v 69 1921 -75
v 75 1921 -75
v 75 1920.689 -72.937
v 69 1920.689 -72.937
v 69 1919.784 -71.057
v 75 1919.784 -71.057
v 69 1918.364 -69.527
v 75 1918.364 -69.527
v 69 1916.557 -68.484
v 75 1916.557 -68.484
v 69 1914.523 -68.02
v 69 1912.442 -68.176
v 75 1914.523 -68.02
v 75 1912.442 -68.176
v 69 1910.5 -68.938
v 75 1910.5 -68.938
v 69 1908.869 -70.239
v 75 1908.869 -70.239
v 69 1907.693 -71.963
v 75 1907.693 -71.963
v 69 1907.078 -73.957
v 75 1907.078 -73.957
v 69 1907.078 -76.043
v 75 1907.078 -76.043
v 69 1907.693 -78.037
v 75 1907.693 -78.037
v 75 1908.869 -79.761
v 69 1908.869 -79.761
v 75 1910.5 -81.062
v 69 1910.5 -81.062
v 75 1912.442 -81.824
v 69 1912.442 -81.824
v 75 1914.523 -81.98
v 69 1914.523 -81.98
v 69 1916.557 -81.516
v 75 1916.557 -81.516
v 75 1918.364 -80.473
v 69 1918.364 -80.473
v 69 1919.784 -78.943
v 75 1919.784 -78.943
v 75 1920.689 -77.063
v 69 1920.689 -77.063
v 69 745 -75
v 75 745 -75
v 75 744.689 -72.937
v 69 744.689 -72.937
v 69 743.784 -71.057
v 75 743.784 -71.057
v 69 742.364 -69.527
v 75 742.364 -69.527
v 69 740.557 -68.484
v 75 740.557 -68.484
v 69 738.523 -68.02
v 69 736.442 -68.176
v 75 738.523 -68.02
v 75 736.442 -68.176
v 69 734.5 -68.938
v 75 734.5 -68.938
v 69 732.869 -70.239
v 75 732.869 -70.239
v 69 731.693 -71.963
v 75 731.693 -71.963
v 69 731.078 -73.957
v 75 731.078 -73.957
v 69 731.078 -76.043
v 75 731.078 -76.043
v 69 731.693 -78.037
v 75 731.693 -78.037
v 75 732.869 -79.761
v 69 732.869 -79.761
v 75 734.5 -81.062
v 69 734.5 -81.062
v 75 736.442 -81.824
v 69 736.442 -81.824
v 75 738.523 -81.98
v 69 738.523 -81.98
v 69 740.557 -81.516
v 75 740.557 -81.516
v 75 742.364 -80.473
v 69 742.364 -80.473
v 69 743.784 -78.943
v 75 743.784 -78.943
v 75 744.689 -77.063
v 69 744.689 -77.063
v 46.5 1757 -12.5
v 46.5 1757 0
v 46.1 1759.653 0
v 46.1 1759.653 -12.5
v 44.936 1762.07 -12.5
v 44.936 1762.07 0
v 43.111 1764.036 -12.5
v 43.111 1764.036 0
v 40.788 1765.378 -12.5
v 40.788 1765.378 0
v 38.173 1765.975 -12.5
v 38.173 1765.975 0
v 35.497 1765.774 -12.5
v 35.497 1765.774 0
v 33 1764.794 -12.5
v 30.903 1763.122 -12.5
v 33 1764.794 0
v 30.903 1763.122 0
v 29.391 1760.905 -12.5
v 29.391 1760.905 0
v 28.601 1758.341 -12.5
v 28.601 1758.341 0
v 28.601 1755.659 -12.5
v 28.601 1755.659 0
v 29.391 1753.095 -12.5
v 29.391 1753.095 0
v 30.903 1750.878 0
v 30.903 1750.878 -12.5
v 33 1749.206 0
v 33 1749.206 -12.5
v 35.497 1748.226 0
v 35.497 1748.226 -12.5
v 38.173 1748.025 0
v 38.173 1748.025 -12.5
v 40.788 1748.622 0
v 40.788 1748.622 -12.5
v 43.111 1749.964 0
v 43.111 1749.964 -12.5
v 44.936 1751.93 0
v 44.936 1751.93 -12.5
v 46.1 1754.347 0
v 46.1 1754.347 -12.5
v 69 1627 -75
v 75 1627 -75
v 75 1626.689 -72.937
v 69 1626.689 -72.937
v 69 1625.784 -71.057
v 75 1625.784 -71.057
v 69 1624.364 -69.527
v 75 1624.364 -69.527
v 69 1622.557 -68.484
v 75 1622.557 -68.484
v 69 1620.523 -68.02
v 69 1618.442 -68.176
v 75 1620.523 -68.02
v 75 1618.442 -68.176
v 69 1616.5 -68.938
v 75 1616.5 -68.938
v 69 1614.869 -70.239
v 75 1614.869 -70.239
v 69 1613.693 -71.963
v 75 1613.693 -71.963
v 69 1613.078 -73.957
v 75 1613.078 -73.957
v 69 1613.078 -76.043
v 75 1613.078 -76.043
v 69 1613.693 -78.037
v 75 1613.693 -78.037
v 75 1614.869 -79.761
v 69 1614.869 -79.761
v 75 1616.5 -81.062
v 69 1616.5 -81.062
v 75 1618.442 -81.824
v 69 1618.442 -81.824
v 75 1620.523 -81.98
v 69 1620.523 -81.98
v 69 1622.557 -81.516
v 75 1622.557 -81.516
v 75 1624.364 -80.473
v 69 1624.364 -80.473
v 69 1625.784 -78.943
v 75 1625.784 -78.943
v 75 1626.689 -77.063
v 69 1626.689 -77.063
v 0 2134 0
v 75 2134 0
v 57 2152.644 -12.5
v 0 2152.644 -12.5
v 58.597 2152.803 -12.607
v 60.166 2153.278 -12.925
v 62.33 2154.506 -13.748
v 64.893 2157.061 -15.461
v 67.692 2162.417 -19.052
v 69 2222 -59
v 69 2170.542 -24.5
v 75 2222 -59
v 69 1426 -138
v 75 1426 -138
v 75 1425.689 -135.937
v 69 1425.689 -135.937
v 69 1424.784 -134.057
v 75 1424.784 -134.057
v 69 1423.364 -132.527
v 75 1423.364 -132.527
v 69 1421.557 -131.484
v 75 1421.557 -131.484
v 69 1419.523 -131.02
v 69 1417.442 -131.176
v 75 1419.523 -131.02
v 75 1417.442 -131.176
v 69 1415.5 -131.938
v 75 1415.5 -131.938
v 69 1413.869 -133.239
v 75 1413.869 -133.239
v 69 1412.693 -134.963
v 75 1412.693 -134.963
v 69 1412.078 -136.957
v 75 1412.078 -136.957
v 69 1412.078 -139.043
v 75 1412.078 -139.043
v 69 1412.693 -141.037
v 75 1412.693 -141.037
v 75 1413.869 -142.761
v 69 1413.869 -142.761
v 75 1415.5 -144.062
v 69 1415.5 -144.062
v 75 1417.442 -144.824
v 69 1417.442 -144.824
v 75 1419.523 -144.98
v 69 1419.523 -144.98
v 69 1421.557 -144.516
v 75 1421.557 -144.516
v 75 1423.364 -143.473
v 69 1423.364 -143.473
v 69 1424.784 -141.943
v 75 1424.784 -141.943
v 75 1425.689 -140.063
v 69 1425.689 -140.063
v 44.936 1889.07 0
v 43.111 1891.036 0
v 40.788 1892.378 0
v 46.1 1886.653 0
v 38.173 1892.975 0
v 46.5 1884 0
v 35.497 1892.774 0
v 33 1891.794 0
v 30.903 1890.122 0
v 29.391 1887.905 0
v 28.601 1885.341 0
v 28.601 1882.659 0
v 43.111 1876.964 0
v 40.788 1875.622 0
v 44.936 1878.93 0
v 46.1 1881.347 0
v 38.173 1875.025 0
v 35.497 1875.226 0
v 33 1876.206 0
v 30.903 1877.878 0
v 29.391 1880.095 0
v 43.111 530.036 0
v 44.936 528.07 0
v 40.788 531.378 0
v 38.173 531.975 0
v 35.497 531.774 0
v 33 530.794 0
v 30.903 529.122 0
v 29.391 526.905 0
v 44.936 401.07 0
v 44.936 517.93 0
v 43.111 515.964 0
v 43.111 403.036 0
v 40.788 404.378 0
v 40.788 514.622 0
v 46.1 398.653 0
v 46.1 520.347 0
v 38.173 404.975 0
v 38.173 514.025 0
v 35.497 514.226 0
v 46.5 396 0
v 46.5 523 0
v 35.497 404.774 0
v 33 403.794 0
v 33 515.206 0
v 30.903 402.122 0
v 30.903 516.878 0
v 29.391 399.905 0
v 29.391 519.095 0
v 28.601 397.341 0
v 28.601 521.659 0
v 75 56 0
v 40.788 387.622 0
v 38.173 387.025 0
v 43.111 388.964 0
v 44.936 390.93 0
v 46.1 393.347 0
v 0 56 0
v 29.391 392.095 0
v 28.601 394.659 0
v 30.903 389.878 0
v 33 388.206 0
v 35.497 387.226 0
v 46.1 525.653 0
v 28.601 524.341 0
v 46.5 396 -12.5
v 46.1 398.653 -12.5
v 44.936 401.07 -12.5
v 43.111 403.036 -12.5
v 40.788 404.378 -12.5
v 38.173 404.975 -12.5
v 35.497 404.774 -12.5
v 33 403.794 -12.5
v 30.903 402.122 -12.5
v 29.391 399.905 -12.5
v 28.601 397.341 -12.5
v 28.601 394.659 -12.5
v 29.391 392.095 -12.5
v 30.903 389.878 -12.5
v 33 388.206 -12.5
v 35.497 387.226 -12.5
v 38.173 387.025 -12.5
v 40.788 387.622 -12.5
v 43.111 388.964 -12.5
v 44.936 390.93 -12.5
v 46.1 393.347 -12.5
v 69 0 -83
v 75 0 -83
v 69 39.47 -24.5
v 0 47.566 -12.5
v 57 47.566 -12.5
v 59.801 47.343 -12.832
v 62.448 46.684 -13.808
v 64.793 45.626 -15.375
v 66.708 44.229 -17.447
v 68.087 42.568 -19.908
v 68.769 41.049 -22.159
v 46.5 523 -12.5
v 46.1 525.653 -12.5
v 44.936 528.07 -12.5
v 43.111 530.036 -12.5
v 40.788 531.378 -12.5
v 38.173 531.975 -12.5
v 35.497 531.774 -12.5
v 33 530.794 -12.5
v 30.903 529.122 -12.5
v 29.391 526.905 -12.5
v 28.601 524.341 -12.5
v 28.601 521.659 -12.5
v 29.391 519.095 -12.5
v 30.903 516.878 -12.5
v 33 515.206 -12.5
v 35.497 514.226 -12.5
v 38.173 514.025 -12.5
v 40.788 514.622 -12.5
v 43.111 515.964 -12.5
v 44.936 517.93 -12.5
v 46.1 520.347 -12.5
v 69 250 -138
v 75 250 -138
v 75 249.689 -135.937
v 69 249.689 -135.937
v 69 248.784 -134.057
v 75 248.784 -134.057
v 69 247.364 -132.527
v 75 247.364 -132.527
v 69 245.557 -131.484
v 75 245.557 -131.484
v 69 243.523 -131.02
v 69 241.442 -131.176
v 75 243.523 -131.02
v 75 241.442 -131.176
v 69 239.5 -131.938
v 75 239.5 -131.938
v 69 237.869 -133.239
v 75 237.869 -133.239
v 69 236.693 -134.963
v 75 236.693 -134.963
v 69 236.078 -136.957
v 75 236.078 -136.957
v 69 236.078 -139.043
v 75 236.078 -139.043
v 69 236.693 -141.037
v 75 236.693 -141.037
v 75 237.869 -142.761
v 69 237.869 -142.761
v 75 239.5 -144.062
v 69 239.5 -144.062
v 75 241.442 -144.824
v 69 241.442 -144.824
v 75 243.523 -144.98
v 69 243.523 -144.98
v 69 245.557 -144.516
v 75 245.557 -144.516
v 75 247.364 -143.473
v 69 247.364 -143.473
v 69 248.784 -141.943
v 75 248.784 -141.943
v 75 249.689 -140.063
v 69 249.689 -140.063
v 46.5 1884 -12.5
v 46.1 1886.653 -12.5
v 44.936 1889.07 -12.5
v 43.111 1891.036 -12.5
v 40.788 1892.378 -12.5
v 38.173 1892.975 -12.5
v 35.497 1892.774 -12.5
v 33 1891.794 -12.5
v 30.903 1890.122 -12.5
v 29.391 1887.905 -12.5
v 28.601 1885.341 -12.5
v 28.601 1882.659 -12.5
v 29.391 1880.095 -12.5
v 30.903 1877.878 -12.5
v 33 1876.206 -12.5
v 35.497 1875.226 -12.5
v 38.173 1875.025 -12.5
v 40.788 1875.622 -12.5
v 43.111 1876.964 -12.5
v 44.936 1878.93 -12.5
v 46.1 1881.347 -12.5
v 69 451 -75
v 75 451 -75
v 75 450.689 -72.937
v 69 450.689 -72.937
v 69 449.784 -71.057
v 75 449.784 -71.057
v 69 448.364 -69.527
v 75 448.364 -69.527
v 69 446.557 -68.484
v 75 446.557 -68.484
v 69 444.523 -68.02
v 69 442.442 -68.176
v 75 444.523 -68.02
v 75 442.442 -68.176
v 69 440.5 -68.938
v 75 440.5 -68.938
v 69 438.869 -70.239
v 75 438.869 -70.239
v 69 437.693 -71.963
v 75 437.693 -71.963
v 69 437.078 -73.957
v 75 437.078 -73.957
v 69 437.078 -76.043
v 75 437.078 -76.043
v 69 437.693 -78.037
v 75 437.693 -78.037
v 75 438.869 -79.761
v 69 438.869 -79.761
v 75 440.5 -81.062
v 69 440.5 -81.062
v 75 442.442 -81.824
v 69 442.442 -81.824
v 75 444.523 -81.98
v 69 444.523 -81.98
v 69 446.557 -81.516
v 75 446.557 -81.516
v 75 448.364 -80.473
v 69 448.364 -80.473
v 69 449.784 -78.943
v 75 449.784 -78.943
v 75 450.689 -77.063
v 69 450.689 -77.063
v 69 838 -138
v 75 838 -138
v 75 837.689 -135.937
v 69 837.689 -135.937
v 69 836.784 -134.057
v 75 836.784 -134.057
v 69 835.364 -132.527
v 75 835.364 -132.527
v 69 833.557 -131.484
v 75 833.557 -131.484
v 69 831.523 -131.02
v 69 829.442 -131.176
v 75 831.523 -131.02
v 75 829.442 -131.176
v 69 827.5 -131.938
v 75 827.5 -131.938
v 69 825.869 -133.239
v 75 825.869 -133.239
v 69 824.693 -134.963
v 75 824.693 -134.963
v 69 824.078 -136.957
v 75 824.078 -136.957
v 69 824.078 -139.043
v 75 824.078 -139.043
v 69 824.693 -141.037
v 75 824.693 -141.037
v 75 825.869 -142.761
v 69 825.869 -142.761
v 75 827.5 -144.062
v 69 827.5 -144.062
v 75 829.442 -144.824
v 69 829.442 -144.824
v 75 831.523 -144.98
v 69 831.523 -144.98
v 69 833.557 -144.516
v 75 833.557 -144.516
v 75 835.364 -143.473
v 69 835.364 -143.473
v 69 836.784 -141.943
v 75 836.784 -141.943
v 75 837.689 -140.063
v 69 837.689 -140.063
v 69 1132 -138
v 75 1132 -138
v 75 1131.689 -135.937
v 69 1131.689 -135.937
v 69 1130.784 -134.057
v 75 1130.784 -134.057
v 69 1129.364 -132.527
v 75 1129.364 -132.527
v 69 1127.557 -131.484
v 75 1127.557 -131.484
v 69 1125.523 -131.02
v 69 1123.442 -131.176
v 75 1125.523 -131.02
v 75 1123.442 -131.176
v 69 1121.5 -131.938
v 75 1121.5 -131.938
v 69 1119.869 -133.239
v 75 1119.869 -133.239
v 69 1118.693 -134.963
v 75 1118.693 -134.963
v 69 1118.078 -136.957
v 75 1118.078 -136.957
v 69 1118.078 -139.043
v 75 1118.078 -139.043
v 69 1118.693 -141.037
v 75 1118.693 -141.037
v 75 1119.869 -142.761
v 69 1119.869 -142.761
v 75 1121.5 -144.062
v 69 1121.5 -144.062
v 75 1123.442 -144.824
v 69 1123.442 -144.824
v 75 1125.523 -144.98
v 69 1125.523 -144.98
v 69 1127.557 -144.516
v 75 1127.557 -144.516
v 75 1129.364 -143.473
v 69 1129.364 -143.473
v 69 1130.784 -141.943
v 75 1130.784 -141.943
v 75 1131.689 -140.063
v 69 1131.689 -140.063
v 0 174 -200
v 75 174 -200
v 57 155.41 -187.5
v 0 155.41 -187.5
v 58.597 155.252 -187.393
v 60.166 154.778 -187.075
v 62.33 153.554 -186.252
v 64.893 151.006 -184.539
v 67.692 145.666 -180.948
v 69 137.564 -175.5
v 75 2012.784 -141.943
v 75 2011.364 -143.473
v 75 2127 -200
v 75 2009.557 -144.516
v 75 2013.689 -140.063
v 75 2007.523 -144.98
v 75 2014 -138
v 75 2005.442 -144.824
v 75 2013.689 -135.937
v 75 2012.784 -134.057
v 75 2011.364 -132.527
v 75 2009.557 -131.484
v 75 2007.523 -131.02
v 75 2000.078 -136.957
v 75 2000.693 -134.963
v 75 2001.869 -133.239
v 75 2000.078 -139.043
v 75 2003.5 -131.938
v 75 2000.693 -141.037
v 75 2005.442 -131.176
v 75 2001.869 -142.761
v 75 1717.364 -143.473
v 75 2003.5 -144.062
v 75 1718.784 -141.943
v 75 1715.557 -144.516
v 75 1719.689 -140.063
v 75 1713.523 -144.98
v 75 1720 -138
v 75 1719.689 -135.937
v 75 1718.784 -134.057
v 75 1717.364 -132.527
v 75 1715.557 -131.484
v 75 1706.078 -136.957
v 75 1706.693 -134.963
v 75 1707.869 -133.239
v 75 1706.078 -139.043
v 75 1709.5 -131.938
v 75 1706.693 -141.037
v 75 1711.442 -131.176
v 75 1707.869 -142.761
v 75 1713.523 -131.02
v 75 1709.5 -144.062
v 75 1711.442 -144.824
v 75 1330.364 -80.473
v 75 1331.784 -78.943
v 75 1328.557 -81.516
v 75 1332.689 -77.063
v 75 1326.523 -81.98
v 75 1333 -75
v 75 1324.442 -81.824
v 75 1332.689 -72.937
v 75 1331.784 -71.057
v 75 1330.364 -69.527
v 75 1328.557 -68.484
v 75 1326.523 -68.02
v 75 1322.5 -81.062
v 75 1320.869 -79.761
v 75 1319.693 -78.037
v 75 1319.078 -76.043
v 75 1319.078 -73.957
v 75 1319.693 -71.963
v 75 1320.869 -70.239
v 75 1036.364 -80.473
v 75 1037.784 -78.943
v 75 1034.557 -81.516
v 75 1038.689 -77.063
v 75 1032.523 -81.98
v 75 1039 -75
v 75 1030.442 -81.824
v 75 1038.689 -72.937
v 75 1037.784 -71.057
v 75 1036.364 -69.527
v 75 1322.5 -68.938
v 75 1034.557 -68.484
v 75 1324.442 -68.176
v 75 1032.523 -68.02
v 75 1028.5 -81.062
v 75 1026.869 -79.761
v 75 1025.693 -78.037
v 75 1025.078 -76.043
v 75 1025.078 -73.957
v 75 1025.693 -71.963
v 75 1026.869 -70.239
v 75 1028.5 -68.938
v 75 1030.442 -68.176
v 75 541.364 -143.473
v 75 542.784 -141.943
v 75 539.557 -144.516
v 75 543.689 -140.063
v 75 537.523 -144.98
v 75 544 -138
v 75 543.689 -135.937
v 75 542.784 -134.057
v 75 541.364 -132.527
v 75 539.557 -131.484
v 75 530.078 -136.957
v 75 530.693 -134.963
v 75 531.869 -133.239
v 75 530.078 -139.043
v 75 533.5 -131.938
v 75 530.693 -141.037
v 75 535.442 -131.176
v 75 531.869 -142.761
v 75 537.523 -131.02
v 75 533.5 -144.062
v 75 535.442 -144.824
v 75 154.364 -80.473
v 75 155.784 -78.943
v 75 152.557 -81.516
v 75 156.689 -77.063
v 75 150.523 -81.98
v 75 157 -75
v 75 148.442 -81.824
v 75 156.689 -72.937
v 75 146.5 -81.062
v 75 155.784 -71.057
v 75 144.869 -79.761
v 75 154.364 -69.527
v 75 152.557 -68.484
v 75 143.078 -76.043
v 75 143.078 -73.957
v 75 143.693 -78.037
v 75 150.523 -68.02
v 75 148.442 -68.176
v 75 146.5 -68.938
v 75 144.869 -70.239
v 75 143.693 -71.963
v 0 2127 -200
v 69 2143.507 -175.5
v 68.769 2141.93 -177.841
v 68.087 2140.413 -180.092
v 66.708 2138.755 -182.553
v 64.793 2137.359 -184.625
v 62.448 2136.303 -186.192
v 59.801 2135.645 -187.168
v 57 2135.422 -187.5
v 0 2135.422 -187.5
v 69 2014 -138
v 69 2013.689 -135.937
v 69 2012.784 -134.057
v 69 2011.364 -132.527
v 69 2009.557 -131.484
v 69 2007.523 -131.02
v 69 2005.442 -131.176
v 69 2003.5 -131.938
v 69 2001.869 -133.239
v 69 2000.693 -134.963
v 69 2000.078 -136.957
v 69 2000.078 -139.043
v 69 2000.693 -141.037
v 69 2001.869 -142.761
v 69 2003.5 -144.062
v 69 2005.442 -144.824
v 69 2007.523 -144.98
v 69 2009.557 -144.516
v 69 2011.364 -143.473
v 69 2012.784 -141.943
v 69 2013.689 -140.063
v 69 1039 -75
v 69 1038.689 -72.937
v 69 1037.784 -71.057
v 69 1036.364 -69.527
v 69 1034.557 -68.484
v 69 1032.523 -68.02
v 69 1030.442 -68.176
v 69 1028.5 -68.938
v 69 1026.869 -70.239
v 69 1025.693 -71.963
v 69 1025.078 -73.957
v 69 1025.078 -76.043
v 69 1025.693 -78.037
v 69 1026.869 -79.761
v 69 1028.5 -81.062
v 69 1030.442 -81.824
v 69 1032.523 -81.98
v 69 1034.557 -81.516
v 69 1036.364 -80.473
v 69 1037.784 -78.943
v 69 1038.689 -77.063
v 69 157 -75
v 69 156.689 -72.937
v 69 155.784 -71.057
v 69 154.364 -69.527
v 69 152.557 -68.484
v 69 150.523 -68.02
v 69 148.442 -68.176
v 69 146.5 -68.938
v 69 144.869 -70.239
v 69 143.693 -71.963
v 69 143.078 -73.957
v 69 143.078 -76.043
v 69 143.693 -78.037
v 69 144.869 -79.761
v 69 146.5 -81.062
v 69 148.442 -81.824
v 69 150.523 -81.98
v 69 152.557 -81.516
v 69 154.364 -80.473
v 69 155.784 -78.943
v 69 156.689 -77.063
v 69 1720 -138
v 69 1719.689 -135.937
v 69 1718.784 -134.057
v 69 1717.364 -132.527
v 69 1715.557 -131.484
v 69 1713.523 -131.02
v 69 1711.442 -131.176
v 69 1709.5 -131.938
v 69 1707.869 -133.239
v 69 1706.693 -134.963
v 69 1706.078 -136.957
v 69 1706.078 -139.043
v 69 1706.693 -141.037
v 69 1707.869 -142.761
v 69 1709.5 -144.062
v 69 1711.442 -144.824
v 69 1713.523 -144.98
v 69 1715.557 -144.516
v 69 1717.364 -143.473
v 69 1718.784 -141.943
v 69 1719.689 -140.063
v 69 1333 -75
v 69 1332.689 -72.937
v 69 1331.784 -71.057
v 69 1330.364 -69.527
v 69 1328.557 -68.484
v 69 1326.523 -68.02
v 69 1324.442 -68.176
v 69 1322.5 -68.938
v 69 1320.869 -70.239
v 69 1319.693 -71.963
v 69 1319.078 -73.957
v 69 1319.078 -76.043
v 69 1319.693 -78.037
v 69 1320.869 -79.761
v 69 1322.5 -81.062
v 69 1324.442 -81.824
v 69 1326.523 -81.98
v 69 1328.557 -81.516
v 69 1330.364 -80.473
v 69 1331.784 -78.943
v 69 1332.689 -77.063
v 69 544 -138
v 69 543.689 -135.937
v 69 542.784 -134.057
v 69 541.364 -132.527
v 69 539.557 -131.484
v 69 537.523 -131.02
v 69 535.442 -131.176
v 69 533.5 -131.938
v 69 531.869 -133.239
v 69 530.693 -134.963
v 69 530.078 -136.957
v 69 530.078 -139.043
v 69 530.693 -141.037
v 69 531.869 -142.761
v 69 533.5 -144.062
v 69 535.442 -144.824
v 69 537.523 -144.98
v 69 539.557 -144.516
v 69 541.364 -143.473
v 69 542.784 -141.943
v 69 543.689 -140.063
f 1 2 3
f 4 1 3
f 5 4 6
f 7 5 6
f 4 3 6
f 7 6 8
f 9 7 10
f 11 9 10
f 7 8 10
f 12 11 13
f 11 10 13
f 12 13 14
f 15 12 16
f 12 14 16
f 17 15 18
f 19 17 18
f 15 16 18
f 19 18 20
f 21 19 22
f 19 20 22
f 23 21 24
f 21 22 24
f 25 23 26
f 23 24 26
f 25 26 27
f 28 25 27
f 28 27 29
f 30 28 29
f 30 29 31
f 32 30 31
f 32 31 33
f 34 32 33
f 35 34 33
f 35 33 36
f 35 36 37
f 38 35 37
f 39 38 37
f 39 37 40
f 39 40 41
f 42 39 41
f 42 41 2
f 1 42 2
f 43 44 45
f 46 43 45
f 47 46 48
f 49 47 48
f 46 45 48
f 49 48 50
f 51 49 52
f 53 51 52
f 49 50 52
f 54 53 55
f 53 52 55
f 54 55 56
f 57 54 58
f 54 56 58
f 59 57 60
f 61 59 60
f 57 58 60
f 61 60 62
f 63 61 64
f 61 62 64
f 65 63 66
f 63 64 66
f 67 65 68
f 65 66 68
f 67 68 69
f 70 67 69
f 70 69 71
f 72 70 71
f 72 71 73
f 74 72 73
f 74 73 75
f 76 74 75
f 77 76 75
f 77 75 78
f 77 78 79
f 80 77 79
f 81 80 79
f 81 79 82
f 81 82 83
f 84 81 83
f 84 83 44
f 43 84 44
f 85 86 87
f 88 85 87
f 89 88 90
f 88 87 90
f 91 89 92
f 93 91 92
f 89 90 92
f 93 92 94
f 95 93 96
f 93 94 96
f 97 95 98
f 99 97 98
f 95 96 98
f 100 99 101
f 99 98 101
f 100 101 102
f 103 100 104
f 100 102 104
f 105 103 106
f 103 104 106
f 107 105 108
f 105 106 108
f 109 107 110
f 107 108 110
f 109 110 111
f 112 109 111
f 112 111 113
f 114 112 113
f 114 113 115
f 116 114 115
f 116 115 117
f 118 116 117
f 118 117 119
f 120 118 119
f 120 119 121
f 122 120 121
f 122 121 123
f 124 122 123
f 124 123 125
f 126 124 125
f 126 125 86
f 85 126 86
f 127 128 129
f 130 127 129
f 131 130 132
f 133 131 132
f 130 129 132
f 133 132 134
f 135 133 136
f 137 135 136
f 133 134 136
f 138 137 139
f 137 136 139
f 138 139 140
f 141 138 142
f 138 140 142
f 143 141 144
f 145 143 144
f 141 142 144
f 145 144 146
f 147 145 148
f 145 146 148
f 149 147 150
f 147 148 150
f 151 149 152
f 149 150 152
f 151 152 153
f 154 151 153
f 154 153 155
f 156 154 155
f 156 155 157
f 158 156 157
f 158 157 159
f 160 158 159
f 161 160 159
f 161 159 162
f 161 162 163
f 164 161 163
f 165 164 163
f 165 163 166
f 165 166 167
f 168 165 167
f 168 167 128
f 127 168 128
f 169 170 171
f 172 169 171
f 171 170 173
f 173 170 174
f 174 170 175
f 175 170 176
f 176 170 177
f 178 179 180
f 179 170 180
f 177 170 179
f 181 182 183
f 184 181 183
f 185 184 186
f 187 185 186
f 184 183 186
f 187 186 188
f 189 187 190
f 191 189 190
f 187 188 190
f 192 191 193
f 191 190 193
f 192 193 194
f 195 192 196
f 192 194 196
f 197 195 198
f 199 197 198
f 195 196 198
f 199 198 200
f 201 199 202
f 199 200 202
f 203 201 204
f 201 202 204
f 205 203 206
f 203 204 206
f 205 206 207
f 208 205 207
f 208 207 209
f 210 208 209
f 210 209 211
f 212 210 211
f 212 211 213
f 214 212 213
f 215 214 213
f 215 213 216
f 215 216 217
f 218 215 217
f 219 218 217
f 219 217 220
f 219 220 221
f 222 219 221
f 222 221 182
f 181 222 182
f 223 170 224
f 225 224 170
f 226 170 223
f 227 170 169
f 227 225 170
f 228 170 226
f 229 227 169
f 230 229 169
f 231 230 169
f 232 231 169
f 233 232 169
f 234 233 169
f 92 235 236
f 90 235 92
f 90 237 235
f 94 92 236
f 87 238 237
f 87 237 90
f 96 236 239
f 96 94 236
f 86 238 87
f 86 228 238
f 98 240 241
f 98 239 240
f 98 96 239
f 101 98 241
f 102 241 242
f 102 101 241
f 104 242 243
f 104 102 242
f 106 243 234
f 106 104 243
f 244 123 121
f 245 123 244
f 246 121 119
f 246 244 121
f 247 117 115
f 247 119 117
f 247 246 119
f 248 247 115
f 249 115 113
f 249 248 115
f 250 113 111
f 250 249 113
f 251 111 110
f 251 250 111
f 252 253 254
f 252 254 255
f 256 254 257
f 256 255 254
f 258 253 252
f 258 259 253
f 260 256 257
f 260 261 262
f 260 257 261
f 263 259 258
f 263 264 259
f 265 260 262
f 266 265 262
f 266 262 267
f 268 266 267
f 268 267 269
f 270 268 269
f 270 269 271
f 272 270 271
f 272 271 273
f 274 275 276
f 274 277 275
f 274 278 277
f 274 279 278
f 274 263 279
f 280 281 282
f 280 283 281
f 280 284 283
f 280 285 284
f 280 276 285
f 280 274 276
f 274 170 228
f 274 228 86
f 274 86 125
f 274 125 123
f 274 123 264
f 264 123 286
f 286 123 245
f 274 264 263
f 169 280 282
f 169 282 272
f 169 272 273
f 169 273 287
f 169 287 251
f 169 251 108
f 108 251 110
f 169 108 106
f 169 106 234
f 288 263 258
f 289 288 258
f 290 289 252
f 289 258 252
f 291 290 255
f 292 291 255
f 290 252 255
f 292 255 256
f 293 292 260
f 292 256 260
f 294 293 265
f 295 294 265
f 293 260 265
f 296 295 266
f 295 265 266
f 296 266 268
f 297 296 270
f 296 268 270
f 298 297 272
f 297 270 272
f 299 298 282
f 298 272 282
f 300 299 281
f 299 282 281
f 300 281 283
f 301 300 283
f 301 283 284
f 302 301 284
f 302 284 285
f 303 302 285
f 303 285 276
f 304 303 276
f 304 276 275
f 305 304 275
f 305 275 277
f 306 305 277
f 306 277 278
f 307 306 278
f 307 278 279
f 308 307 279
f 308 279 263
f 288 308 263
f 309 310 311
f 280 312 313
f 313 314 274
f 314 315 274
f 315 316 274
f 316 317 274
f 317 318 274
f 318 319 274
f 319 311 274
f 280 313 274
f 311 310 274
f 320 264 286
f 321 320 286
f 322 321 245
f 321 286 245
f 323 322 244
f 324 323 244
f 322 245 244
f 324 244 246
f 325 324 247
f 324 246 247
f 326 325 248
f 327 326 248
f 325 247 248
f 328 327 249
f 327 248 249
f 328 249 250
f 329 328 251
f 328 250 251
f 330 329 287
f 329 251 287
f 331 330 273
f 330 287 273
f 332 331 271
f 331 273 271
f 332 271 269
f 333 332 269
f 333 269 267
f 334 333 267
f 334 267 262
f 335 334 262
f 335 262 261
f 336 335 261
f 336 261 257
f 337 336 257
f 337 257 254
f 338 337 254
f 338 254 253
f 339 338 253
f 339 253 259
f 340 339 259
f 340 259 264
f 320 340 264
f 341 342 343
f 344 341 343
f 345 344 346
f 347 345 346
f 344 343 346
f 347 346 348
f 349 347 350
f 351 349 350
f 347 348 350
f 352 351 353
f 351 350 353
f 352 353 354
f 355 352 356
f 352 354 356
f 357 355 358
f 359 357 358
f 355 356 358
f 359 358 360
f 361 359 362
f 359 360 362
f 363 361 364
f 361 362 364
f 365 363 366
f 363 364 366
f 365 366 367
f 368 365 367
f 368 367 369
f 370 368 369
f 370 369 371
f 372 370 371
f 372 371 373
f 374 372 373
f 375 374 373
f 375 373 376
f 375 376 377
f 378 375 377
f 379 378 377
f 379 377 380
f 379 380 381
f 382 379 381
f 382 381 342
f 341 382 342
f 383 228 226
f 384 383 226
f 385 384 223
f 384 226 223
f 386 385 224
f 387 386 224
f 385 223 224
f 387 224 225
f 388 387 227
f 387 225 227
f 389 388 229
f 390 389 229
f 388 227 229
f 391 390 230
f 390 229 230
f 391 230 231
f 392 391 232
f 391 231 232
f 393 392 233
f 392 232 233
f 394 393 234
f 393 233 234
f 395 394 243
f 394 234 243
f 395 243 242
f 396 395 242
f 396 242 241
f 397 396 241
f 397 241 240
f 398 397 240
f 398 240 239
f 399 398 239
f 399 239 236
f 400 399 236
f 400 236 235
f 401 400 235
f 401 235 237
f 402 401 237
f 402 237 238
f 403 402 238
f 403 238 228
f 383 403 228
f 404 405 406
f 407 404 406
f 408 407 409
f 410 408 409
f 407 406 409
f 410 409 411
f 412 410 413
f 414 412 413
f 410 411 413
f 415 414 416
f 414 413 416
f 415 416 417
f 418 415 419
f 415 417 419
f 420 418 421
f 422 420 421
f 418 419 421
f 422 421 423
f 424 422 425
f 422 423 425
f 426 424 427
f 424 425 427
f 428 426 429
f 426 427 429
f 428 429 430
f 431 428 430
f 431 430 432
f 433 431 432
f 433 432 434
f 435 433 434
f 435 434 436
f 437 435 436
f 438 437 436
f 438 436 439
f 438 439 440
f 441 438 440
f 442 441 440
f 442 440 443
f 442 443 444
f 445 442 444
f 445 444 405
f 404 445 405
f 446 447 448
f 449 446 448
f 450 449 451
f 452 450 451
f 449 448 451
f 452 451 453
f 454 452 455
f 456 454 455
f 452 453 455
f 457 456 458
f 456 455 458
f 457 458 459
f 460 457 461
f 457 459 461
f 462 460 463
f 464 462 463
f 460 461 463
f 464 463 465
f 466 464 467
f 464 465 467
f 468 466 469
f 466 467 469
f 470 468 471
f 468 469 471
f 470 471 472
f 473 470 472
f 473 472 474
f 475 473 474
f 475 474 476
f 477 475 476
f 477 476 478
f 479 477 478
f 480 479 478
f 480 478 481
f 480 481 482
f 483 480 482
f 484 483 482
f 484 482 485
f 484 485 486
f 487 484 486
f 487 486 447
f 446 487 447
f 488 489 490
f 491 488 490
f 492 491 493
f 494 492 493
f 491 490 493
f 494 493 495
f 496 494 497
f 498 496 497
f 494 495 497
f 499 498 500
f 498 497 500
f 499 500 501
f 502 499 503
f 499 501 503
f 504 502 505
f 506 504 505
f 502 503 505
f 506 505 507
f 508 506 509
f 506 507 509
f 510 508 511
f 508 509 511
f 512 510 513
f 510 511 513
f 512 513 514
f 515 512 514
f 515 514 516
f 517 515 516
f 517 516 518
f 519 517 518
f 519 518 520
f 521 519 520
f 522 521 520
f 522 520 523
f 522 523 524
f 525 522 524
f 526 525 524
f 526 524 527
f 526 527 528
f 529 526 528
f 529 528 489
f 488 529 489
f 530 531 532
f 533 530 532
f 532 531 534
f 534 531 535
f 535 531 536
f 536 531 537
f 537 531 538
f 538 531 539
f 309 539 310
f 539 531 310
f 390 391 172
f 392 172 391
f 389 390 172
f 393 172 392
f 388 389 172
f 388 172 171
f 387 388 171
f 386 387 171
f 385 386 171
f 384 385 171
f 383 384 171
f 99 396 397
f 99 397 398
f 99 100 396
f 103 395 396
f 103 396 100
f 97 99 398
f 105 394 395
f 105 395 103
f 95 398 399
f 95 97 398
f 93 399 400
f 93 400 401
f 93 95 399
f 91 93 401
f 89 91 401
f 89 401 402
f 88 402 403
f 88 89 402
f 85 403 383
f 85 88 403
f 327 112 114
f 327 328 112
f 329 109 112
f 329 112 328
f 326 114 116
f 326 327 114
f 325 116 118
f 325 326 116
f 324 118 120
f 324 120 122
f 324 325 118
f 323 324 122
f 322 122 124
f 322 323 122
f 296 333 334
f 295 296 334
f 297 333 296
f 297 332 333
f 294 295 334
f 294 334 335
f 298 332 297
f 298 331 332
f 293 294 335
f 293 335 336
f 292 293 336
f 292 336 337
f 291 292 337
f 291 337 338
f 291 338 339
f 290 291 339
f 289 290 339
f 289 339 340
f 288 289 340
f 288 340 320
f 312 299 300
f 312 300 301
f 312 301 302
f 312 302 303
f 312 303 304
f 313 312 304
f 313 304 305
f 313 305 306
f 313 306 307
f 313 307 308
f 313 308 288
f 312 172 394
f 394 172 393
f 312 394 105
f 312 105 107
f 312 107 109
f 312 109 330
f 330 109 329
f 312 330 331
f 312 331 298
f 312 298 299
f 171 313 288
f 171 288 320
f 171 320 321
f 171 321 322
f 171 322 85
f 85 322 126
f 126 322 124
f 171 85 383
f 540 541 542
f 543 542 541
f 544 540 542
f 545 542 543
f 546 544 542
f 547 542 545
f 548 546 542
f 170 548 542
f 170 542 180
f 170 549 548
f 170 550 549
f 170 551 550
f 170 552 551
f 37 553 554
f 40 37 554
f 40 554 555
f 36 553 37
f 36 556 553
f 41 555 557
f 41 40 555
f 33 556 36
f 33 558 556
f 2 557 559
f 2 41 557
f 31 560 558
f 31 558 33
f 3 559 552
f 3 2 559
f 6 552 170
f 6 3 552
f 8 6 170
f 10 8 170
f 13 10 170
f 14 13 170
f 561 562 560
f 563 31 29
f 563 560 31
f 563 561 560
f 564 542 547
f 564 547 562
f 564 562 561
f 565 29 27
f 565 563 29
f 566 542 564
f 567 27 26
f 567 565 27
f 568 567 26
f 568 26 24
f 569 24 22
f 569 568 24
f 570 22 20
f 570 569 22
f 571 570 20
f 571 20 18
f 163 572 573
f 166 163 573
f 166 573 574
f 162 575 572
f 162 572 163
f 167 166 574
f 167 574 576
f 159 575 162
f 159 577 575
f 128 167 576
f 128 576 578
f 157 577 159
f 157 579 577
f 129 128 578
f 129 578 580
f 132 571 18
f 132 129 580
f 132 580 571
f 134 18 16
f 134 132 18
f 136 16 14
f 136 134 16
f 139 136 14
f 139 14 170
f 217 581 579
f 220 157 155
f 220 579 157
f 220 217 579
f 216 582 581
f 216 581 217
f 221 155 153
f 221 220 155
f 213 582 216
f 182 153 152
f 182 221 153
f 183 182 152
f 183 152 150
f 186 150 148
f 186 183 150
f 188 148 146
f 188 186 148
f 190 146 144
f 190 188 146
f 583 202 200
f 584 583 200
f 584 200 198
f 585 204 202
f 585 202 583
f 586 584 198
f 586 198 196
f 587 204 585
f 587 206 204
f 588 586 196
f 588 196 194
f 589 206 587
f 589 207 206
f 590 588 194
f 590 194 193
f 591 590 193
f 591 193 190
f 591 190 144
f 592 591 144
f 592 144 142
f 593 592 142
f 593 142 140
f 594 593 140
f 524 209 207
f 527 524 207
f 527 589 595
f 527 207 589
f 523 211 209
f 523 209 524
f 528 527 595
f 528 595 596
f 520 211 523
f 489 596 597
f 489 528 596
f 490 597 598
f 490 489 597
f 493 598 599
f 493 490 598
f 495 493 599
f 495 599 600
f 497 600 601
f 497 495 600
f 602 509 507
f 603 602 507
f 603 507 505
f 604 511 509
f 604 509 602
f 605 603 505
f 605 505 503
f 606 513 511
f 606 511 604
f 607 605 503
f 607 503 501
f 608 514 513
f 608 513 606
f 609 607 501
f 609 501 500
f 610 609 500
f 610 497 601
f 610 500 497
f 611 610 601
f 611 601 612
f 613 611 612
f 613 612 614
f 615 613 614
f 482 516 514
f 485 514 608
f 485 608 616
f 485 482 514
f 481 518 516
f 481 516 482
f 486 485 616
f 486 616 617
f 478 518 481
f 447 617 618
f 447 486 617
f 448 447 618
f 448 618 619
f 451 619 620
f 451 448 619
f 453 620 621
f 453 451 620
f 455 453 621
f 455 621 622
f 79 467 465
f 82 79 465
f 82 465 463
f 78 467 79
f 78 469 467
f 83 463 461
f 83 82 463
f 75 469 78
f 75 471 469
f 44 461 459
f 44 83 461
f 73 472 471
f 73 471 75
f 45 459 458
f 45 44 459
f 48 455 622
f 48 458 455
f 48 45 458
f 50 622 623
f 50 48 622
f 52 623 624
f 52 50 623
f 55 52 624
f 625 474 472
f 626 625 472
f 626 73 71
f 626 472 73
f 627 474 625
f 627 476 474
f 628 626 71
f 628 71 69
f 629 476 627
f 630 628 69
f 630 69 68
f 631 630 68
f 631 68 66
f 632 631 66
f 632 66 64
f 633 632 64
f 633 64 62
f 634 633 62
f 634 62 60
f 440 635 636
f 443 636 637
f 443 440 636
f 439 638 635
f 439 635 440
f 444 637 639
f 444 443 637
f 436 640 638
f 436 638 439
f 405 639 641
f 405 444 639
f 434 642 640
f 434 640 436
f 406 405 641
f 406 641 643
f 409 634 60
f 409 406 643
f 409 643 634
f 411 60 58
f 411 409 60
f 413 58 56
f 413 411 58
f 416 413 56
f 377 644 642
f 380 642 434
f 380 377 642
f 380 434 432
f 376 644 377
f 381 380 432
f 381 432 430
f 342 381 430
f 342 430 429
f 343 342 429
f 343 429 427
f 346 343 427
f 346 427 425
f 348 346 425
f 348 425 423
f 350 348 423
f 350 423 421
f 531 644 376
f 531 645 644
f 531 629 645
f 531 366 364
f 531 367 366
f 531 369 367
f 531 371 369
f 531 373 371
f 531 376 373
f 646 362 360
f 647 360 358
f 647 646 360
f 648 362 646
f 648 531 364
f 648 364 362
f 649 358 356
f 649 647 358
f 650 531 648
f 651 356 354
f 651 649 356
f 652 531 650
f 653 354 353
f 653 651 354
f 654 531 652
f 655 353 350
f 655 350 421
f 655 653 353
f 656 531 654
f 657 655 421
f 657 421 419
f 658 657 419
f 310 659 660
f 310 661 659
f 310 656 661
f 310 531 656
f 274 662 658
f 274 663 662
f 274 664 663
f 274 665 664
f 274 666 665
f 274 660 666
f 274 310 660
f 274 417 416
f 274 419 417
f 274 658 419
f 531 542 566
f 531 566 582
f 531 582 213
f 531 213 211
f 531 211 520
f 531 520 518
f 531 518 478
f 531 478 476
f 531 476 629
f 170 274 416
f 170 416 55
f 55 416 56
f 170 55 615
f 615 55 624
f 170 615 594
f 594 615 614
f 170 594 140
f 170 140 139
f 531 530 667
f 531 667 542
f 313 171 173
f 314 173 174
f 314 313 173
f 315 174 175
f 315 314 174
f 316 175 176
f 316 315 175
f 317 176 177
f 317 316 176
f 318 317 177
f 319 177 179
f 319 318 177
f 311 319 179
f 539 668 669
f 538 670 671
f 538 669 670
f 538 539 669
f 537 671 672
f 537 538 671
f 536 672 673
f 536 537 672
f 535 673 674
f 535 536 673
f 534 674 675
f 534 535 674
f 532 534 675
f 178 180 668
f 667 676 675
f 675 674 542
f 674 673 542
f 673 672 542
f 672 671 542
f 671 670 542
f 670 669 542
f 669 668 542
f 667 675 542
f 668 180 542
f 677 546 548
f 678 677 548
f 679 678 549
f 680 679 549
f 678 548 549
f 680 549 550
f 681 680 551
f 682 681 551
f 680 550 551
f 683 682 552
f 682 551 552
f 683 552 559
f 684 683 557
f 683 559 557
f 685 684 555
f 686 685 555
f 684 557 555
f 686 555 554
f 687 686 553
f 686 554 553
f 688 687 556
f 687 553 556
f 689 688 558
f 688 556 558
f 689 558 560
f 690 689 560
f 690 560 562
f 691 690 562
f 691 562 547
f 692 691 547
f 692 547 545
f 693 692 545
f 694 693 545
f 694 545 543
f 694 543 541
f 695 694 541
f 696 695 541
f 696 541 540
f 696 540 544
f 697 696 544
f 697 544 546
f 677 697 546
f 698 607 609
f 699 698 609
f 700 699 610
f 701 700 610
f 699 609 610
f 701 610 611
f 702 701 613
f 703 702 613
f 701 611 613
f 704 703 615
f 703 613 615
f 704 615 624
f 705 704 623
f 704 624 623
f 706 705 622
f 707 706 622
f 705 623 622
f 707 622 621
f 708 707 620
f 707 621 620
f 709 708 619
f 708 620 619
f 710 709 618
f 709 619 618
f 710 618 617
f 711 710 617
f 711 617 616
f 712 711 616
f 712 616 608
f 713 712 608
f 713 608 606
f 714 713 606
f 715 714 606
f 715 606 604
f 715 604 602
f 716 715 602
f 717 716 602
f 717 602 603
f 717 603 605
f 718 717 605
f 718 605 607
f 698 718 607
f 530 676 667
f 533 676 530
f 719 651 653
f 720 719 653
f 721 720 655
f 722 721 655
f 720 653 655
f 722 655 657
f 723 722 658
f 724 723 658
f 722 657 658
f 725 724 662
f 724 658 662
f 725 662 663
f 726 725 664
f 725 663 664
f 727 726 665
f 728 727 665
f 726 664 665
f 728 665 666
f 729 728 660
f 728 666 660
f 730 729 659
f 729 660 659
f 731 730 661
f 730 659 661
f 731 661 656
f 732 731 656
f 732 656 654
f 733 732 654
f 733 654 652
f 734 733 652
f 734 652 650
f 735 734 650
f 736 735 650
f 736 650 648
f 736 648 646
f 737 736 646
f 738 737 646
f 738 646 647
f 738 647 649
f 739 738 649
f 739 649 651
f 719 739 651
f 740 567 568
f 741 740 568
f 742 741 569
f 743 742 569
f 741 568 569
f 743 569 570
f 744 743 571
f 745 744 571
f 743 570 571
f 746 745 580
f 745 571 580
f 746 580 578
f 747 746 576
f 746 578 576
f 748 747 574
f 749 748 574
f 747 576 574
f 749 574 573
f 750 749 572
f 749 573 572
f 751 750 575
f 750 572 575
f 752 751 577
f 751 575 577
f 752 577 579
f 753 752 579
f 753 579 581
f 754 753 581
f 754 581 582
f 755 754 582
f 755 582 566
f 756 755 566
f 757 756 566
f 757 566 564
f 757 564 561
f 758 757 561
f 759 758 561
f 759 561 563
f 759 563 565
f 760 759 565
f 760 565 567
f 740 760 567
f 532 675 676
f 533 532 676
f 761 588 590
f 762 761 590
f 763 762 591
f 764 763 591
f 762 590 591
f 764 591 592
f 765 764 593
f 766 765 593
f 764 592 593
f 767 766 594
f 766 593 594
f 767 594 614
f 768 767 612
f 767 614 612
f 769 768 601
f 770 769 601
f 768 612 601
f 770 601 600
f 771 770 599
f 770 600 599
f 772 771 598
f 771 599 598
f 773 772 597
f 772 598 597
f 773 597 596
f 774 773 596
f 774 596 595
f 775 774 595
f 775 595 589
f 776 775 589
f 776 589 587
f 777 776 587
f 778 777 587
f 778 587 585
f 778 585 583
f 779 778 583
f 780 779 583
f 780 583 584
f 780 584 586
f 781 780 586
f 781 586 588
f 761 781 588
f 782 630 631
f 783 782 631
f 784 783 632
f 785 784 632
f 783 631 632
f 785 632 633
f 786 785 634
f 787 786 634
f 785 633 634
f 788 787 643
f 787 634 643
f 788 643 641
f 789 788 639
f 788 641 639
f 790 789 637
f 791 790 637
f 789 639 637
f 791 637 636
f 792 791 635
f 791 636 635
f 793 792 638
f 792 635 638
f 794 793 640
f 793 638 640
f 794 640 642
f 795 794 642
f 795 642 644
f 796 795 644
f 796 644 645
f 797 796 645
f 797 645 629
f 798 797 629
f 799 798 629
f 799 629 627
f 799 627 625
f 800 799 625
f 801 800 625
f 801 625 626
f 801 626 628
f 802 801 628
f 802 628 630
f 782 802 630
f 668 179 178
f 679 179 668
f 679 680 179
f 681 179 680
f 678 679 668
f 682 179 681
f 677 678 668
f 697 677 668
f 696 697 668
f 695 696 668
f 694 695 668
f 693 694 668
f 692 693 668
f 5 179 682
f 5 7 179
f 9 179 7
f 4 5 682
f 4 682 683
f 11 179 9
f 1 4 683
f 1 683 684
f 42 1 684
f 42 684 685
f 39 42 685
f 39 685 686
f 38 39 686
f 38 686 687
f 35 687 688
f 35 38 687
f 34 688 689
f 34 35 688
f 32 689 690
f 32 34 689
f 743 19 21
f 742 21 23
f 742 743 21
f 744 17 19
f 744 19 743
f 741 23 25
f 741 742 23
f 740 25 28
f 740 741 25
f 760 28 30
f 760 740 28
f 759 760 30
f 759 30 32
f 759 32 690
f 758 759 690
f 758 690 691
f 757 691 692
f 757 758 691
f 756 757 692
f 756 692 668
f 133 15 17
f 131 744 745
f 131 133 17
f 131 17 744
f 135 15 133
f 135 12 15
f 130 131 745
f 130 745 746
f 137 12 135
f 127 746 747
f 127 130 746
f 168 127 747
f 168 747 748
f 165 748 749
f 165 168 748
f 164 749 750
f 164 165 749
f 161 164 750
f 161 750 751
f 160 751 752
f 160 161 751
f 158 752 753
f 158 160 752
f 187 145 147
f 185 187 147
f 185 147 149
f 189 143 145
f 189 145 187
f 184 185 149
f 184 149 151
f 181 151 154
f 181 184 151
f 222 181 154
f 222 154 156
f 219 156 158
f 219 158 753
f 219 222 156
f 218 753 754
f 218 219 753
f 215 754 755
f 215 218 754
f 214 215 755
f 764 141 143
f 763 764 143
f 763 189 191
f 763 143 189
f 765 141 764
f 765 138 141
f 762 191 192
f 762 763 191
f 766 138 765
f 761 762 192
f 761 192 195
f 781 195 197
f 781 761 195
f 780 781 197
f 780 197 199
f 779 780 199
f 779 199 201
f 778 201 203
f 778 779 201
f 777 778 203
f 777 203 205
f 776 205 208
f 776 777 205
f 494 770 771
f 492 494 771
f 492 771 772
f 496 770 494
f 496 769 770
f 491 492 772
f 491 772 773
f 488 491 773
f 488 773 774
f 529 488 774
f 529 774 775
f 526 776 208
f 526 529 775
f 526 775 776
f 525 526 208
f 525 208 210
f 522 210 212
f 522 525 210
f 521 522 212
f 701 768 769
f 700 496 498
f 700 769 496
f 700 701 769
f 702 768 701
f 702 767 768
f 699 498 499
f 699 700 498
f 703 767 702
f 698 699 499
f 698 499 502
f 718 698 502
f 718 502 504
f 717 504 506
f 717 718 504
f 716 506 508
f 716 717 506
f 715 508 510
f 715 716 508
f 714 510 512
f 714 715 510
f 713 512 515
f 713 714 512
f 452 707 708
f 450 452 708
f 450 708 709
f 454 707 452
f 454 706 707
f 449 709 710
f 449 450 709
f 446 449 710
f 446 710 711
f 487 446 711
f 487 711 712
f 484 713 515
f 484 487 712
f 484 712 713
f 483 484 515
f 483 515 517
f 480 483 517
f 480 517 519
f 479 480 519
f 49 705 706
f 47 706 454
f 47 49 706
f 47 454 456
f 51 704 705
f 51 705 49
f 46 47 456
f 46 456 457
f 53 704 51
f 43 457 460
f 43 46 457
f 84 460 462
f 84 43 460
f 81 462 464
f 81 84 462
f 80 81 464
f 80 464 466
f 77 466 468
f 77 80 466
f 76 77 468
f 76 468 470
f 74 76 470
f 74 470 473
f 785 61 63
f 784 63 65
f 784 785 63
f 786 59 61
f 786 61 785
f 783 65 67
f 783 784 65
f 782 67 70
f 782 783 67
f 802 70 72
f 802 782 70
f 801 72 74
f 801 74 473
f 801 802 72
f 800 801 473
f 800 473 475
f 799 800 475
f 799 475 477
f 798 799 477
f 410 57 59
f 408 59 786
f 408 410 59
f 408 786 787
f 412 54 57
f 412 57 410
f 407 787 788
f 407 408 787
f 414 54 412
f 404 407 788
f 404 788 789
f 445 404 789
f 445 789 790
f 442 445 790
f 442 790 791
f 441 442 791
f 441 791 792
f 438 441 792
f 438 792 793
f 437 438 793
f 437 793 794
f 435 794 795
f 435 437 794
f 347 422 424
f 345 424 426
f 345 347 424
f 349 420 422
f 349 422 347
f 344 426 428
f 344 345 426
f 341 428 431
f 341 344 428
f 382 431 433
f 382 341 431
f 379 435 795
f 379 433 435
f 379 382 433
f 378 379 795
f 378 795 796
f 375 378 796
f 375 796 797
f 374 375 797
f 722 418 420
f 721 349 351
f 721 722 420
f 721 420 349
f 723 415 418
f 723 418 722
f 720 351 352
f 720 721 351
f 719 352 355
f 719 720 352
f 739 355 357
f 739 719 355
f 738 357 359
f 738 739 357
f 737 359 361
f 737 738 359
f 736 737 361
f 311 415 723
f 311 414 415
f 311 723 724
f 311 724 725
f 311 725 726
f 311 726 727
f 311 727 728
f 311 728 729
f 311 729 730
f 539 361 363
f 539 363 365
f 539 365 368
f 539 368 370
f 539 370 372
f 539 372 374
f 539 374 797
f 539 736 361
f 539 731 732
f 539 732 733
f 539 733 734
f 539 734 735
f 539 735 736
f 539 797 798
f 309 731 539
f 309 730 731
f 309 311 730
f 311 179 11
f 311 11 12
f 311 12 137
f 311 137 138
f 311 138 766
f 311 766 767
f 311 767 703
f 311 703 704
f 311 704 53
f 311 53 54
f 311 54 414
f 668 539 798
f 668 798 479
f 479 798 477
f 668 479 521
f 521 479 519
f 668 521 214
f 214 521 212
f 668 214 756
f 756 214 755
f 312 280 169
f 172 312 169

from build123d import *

# Parameters (mm, degrees)
F1_DEPTH = 2222
F2_R     = 7
F3_DEPTH = 75.001
F4_R     = 9
F5_DEPTH = 25


with BuildPart() as f1:
    # F0 (on Front) → F1 (new body)
    with BuildSketch(Plane.XZ):
        with BuildLine():
            Line((75, 0), (0, 0))
            Line((0, 0), (0, -12.5))
            Line((0, -12.5), (57, -12.5))
            ThreePointArc((57, -12.5), (65.485281, -16.014719), (69, -24.5))
            Line((69, -24.5), (69, -175.5))
            ThreePointArc((69, -175.5), (65.485281, -183.985281), (57, -187.5))
            Line((57, -187.5), (0, -187.5))
            Line((0, -187.5), (0, -200))
            Line((0, -200), (75, -200))
            Line((75, -200), (75, 0))
        make_face()
    extrude(amount=-F1_DEPTH)

    # F2 (on face) → F3 (cut, through all)
    with BuildSketch(Plane.YZ.offset(75)):
        Polygon((174, -200), (0, -83), (0, -200), align=None)
        Polygon((56, 0), (0, 0), (0, -83), align=None)
        Polygon((2222, -59), (2127, -200), (2222, -200), align=None)
        Polygon((2134, 0), (2222, -59), (2222, 0), align=None)
        with Locations((444, -75)):
            Circle(F2_R)
        with Locations((537, -138)):
            Circle(F2_R)
        with Locations((243, -138)):
            Circle(F2_R)
        with Locations((150, -75)):
            Circle(F2_R)
        with Locations((738, -75)):
            Circle(F2_R)
        with Locations((831, -138)):
            Circle(F2_R)
        with Locations((1032, -75)):
            Circle(F2_R)
        with Locations((1125, -138)):
            Circle(F2_R)
        with Locations((1326, -75)):
            Circle(F2_R)
        with Locations((1419, -138)):
            Circle(F2_R)
        with Locations((1620, -75)):
            Circle(F2_R)
        with Locations((1713, -138)):
            Circle(F2_R)
        with Locations((2007, -138)):
            Circle(F2_R)
        with Locations((1914, -75)):
            Circle(F2_R)
    extrude(amount=-F3_DEPTH, mode=Mode.SUBTRACT)

    # F4 (on face) → F5 (cut)
    with BuildSketch(Plane.XY):
        with Locations((37.5, 523)):
            Circle(F4_R)
        with Locations((37.5, 396)):
            Circle(F4_R)
        with Locations((37.5, 1757)):
            Circle(F4_R)
        with Locations((37.5, 1884)):
            Circle(F4_R)
    extrude(amount=-F5_DEPTH, mode=Mode.SUBTRACT)


solid = f1.part
